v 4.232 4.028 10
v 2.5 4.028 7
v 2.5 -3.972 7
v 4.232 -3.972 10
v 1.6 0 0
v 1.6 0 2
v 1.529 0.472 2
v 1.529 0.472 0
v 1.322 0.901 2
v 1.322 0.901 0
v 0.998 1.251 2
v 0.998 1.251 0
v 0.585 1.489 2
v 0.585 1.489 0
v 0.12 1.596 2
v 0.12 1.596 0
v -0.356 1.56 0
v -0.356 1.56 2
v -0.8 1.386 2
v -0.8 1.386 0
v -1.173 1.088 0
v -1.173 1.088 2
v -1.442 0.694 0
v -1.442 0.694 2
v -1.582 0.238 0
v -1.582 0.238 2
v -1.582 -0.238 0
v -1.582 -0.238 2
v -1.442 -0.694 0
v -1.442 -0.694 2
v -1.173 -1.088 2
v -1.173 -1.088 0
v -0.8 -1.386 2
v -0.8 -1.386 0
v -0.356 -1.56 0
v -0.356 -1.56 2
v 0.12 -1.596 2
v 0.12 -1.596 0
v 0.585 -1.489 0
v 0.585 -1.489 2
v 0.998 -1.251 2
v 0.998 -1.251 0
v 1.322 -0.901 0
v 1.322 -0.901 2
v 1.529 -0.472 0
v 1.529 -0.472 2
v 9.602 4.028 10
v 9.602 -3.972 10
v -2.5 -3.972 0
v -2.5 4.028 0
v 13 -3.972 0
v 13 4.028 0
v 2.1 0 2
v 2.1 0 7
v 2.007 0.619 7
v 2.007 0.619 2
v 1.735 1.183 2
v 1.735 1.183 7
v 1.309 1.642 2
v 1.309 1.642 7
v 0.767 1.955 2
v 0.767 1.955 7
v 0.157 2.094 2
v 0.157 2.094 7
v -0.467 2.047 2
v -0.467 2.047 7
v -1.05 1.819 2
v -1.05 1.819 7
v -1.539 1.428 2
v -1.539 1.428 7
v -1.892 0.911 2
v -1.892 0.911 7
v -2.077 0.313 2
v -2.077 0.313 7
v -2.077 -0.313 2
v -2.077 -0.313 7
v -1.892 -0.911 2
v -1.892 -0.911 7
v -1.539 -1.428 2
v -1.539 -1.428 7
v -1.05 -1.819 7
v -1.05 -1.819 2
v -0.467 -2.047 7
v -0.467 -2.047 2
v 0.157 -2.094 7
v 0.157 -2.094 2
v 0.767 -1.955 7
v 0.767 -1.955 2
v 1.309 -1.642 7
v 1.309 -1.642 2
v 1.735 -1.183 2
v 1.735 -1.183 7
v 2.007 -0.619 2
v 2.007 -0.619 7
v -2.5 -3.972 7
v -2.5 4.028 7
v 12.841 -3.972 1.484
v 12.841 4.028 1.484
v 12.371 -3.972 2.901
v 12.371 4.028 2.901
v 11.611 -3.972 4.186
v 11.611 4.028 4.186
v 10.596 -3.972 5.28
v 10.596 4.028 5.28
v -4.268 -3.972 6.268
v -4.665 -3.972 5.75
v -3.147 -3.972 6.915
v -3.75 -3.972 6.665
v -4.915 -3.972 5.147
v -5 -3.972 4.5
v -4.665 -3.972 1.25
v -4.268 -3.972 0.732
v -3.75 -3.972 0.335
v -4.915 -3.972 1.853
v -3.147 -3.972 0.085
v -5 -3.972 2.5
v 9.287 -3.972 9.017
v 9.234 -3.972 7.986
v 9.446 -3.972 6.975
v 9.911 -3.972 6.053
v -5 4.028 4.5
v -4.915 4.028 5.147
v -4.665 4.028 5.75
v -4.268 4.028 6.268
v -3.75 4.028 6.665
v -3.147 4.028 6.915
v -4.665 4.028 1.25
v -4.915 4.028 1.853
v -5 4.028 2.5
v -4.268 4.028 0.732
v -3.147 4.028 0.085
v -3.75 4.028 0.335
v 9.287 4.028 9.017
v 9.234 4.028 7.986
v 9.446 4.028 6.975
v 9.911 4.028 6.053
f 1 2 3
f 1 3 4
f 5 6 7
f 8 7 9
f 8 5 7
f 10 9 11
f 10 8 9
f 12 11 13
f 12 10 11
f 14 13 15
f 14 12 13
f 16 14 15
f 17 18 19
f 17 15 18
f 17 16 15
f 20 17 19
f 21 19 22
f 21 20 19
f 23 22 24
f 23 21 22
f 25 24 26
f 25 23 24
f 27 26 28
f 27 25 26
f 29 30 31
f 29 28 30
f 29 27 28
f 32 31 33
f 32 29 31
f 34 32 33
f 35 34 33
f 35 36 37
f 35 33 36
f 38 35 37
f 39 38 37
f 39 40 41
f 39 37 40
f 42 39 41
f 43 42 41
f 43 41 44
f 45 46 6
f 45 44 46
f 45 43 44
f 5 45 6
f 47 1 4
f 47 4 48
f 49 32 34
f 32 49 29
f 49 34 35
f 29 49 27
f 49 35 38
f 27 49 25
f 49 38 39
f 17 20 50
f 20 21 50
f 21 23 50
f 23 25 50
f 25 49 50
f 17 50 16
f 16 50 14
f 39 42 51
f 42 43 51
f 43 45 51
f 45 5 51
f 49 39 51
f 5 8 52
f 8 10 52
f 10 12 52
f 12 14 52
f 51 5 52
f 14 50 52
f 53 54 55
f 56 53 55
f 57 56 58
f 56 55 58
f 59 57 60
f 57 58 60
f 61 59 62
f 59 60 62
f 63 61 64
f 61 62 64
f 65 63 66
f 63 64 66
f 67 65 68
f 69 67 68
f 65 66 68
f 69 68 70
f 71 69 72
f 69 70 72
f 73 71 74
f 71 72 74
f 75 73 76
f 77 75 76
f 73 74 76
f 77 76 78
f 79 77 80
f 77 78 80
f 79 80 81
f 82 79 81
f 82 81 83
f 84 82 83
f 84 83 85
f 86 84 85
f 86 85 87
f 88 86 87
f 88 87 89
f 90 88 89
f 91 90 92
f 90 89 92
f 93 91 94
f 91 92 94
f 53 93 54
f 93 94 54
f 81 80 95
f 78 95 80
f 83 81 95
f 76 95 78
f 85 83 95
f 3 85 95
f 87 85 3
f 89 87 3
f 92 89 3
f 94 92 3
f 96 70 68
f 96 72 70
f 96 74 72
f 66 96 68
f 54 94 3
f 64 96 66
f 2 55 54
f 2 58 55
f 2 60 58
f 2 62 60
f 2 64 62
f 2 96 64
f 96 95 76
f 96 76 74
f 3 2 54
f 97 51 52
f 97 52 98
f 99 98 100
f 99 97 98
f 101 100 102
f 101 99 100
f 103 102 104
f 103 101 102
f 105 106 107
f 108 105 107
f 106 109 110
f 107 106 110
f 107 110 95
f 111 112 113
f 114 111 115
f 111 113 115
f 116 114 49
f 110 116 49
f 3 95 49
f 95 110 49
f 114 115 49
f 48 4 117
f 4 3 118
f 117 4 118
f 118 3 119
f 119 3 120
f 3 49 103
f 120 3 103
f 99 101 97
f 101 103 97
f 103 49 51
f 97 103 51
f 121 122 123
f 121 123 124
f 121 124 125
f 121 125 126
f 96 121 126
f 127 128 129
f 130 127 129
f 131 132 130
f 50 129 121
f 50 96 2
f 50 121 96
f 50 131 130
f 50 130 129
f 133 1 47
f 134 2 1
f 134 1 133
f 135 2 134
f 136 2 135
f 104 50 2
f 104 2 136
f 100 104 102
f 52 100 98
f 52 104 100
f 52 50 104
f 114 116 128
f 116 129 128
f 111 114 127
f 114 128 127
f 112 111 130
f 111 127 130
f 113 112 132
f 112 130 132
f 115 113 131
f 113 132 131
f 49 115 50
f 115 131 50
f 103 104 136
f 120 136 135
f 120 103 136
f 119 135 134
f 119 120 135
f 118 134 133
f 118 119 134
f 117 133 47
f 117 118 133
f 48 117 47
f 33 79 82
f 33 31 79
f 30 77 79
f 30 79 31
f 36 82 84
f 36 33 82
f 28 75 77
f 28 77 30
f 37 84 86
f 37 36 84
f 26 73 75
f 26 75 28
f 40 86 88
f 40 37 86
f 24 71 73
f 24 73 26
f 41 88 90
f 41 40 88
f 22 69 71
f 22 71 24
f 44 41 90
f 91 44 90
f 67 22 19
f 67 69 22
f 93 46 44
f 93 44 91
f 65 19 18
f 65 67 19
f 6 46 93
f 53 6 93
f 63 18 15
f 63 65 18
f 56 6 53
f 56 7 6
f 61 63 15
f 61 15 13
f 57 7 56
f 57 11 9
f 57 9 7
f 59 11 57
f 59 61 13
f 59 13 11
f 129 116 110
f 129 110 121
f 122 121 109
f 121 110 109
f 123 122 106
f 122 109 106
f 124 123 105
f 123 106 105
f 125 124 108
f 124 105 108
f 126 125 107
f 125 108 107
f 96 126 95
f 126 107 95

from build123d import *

# Parameters (mm, degrees)
SKETCH1_W               = 18
SKETCH1_H               = 8
SKETCH1_R               = 1.6
BOSS_EXTRUDE1_DEPTH     = 10
CUT_EXTRUDE1_DEPTH      = 1
CUT_EXTRUDE1_DEPTH_BACK = 9
CUT_EXTRUDE3_DEPTH      = 1
CUT_EXTRUDE3_DEPTH_BACK = 9
FILLET1_R               = 2.5
SKETCH4_R               = 2.1
CUT_EXTRUDE4_DEPTH      = 4
CUT_EXTRUDE4_DEPTH_BACK = 5


with BuildPart() as part:
    # Sketch1 → Boss-Extrude1 (new body)
    with BuildSketch(Plane.XY):
        with Locations((4, 0.027746394)):
            Rectangle(SKETCH1_W, SKETCH1_H)
        Circle(SKETCH1_R, mode=Mode.SUBTRACT)
    extrude(amount=BOSS_EXTRUDE1_DEPTH)

    # Sketch2 → Cut-Extrude1 (cut, two sides)
    with BuildSketch(Plane.XZ.offset(3.972253606)) as cut_extrude1_sk:
        with BuildLine():
            Line((13.221576202, 12.297519941), (13, 0))
            ThreePointArc((13, 0), (12.370590218, 2.900961957), (10.595548492, 5.280239962))
            ThreePointArc((10.595548492, 5.280239962), (9.475303393, 9.699461467), (13.221576202, 12.297519941))
        make_face()
    extrude(amount=CUT_EXTRUDE1_DEPTH, mode=Mode.SUBTRACT)
    extrude(cut_extrude1_sk.sketch, amount=-CUT_EXTRUDE1_DEPTH_BACK, mode=Mode.SUBTRACT)

    # Sketch3 → Cut-Extrude3 (cut, two sides)
    with BuildSketch(Plane(origin=(0, 4.027746394, 0), x_dir=(1, 0, 0), z_dir=(0, 1, 0))) as cut_extrude3_sk:
        Polygon((-5, -7), (2.5, -7), (4.232050808, -10), (-5, -10), align=None)
    extrude(amount=CUT_EXTRUDE3_DEPTH, mode=Mode.SUBTRACT)
    extrude(cut_extrude3_sk.sketch, amount=-CUT_EXTRUDE3_DEPTH_BACK, mode=Mode.SUBTRACT)

    # Fillet1
    fillet1_edges = [part.edges().sort_by_distance(p)[0] for p in [
        (-5, 0.027746394, 7),
        (-5, 0.027746394, 0),
    ]]
    fillet(fillet1_edges, radius=FILLET1_R)

    # Sketch4 → Cut-Extrude4 (cut, two sides)
    with BuildSketch(Plane.XY.offset(7)) as cut_extrude4_sk:
        Circle(SKETCH4_R)
    extrude(amount=CUT_EXTRUDE4_DEPTH, mode=Mode.SUBTRACT)
    extrude(cut_extrude4_sk.sketch, amount=-CUT_EXTRUDE4_DEPTH_BACK, mode=Mode.SUBTRACT)


solid = part.part
